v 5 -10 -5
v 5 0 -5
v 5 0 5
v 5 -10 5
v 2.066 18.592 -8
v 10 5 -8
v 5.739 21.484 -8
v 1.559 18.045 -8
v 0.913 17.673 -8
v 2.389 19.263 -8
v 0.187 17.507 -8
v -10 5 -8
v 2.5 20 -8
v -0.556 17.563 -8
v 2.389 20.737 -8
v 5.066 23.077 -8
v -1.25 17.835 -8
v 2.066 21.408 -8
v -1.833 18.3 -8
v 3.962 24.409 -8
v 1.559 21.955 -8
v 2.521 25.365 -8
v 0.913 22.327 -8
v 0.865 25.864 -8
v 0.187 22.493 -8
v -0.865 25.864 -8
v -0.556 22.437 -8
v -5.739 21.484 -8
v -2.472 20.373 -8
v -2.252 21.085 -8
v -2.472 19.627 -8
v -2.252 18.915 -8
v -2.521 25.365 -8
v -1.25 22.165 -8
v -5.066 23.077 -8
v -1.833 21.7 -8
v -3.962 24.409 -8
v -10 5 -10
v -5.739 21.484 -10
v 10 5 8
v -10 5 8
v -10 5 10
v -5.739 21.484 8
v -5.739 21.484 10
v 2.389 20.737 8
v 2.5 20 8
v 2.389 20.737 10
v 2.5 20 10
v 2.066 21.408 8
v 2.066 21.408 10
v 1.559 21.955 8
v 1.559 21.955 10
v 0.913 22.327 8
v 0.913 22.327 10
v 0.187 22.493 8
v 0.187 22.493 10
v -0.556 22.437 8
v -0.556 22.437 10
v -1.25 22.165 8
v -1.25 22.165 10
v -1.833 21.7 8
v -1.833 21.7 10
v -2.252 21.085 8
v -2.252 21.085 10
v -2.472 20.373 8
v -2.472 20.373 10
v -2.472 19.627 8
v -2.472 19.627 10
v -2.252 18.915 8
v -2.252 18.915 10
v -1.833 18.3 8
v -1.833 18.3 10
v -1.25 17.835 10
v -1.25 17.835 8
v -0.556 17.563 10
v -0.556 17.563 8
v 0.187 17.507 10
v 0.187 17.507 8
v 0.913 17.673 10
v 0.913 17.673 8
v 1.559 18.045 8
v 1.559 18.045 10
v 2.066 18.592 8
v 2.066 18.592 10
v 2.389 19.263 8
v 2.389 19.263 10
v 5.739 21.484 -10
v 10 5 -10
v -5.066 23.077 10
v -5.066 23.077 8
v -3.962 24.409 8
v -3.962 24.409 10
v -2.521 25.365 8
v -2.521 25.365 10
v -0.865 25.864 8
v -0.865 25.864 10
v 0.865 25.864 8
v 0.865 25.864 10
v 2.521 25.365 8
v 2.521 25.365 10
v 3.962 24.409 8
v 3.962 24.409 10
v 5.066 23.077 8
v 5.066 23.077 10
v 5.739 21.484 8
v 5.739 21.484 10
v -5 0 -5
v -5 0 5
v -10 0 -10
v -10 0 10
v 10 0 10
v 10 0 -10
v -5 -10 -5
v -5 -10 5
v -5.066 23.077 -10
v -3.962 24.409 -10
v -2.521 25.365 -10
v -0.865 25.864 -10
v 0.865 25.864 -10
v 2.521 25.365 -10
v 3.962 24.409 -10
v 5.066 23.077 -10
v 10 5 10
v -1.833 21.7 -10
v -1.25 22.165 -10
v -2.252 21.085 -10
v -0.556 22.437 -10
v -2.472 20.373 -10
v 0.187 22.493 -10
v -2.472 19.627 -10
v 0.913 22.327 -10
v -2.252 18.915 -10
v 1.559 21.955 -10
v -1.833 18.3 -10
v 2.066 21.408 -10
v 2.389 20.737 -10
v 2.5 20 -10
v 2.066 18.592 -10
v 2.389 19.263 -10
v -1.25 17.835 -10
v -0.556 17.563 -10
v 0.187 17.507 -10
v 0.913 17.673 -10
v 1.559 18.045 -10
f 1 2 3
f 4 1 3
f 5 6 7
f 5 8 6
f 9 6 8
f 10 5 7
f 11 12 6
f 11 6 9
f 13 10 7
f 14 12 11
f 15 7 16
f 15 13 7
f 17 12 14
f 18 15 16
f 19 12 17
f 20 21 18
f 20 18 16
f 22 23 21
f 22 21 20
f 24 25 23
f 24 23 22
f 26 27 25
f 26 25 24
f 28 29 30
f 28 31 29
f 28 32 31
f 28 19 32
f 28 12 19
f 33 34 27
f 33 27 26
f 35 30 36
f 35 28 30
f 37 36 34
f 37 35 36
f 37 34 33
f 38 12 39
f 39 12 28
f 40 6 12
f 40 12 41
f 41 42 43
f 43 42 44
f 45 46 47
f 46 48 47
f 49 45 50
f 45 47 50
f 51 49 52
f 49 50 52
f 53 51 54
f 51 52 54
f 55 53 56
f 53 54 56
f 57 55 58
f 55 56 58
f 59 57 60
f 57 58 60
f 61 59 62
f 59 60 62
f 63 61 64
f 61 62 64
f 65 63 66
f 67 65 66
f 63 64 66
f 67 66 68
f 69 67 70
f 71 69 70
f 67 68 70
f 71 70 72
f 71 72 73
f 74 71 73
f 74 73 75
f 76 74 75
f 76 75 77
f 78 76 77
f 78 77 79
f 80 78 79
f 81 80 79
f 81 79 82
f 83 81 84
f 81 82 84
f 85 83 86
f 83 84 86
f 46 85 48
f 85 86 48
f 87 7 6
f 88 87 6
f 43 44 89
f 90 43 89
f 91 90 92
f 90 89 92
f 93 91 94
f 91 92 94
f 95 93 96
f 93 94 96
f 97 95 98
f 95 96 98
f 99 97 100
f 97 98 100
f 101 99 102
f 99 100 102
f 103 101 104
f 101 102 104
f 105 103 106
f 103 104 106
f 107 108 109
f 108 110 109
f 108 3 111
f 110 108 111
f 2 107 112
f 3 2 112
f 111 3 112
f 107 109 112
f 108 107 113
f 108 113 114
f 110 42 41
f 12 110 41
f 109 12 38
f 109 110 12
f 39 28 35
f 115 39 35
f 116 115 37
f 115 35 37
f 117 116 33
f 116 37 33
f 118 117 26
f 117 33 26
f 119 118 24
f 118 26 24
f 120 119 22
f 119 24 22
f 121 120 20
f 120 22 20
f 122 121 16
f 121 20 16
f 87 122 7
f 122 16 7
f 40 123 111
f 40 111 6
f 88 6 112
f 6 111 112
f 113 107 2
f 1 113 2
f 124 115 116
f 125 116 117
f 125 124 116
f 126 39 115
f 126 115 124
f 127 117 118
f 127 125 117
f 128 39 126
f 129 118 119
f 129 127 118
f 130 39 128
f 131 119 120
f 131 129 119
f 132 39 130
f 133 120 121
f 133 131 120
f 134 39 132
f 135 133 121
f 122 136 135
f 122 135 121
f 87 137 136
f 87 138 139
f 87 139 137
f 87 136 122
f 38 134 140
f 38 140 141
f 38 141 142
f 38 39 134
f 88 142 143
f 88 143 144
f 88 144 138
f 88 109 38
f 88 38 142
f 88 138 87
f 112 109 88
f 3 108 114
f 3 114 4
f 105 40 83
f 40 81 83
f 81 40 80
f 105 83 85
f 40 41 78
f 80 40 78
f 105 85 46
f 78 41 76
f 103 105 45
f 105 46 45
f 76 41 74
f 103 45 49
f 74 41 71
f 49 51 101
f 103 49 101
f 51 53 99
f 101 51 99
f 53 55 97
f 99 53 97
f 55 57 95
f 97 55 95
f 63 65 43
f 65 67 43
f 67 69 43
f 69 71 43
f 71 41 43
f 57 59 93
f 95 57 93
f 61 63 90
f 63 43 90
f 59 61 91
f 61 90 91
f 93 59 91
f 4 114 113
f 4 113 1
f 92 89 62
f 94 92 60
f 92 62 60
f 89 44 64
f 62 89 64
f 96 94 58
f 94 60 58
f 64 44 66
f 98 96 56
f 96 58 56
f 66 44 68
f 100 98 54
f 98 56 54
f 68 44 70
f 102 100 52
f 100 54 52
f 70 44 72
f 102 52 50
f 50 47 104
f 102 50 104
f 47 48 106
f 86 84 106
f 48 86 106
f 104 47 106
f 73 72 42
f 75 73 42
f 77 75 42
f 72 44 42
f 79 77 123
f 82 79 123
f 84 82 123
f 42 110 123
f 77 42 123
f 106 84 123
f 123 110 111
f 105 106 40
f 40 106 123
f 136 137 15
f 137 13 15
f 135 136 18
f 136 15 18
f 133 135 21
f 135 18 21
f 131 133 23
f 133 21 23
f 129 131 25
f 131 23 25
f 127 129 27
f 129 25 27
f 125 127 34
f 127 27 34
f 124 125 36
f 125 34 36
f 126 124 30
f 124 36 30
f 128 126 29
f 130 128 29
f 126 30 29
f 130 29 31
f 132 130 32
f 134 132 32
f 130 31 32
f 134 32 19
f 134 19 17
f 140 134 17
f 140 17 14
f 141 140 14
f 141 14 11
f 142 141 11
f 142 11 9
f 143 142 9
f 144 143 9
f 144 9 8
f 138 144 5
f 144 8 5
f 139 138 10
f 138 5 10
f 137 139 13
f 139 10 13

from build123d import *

# Parameters (mm, degrees)
SKETCH3_W           = 20
SKETCH3_H           = 20
BOSS_EXTRUDE1_DEPTH = 30
SKETCH4_W           = 16
SKETCH4_H           = 25
CUT_EXTRUDE1_DEPTH  = 26
SKETCH7_R           = 2.5
CUT_EXTRUDE2_DEPTH  = 16.5
CUT_EXTRUDE3_DEPTH  = 33
SKETCH9_W           = 10
SKETCH9_H           = 10
BOSS_EXTRUDE2_DEPTH = 10


with BuildPart() as part:
    # Sketch3 → Boss-Extrude1 (new body)
    with BuildSketch(Plane(origin=(0, 0, 0), x_dir=(1, 0, 0), z_dir=(0, 1, 0))):
        Rectangle(SKETCH3_W, SKETCH3_H)
    extrude(amount=BOSS_EXTRUDE1_DEPTH)

    # Sketch4 → Cut-Extrude1 (cut)
    with BuildSketch(Plane.ZY.offset(10)):
        with Locations((0, 17.5)):
            Rectangle(SKETCH4_W, SKETCH4_H)
    extrude(amount=-CUT_EXTRUDE1_DEPTH, mode=Mode.SUBTRACT)

    # Sketch7 → Cut-Extrude2 (cut, symmetric)
    with BuildSketch(Plane.XY):
        with Locations((0, 20)):
            Circle(SKETCH7_R)
    extrude(amount=CUT_EXTRUDE2_DEPTH, both=True, mode=Mode.SUBTRACT)

    # Sketch8 → Cut-Extrude3 (cut)
    with BuildSketch(Plane.XY.offset(10)):
        with BuildLine():
            Line((-10, 5), (-5.739080816, 21.483527122))
            ThreePointArc((-5.739080816, 21.483527122), (0, 25.927723116), (5.739080816, 21.483527122))
            Line((5.739080816, 21.483527122), (10, 5))
            Line((10, 5), (10, 30))
            Line((10, 30), (-10, 30))
            Line((-10, 30), (-10, 5))
        make_face()
    extrude(amount=-CUT_EXTRUDE3_DEPTH, mode=Mode.SUBTRACT)

    # Sketch9 → Boss-Extrude2 (add)
    with BuildSketch(Plane.XZ):
        Rectangle(SKETCH9_W, SKETCH9_H)
    extrude(amount=BOSS_EXTRUDE2_DEPTH)


solid = part.part
